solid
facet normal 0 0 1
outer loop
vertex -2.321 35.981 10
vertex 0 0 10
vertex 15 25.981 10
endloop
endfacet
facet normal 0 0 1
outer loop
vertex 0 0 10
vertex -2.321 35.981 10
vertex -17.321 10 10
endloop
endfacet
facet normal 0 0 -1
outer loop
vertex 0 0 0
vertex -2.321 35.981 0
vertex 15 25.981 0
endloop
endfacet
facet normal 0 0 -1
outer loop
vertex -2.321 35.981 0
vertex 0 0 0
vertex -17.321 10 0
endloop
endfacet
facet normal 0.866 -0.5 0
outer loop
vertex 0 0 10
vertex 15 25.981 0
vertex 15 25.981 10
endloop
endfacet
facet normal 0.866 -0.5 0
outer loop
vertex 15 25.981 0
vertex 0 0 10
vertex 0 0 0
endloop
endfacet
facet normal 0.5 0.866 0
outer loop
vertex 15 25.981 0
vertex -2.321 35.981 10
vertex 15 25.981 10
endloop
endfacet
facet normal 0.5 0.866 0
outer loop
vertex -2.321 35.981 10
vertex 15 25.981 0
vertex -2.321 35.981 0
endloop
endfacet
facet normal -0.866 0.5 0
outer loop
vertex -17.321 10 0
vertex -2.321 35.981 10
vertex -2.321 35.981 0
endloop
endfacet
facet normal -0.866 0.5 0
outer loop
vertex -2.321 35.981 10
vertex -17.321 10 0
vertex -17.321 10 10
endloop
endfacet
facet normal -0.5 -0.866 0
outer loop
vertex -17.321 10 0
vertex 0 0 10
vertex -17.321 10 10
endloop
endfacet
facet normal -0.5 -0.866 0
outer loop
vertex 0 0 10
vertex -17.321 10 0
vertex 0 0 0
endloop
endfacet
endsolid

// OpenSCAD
rotate([0,0,60])cube([30,20,10]);
%color([0.5,0.5,1], alpha=0.3) cube([30,20,9.99]);
